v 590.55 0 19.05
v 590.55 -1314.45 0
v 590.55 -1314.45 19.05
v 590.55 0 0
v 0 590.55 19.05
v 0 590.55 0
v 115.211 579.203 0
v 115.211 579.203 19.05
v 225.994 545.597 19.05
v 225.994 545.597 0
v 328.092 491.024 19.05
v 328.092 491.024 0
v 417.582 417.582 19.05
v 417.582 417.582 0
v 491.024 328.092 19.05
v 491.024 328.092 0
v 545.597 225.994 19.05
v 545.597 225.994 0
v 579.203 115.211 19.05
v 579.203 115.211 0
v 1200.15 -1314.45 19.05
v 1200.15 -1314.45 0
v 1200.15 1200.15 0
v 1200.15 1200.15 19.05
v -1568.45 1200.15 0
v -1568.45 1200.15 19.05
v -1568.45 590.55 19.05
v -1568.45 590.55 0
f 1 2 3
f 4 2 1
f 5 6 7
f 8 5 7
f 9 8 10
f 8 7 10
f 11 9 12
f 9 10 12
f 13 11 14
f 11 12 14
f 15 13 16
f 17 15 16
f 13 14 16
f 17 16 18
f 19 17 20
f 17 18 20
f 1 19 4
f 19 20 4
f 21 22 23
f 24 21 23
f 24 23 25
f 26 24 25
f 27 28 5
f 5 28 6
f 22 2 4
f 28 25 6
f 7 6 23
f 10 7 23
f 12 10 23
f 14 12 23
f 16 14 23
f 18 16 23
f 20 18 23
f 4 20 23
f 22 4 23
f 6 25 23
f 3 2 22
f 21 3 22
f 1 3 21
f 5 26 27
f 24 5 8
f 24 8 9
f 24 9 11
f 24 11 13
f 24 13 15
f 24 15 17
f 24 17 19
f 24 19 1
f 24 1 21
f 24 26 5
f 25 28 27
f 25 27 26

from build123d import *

# Parameters (mm, degrees)
F0_W     = 1568.45
F0_H     = 609.6
F0_W_2   = 609.6
F0_H_2   = 1314.45
F1_DEPTH = 19.05


with BuildPart() as f1:
    # F0 (on Top) → F1 (new body)
    with BuildSketch(Plane.XY):
        with Locations((-784.225, 895.35)):
            Rectangle(F0_W, F0_H)
        with BuildLine():
            ThreePointArc((0, 590.55), (417.58191, 417.58191), (590.55, 0))
            Line((590.55, 0), (1200.15, 0))
            Line((1200.15, 0), (1200.15, 1200.15))
            Line((1200.15, 1200.15), (0, 1200.15))
            Line((0, 1200.15), (0, 590.55))
        make_face()
        with Locations((895.35, -657.225)):
            Rectangle(F0_W_2, F0_H_2)
    extrude(amount=F1_DEPTH)


solid = f1.part
